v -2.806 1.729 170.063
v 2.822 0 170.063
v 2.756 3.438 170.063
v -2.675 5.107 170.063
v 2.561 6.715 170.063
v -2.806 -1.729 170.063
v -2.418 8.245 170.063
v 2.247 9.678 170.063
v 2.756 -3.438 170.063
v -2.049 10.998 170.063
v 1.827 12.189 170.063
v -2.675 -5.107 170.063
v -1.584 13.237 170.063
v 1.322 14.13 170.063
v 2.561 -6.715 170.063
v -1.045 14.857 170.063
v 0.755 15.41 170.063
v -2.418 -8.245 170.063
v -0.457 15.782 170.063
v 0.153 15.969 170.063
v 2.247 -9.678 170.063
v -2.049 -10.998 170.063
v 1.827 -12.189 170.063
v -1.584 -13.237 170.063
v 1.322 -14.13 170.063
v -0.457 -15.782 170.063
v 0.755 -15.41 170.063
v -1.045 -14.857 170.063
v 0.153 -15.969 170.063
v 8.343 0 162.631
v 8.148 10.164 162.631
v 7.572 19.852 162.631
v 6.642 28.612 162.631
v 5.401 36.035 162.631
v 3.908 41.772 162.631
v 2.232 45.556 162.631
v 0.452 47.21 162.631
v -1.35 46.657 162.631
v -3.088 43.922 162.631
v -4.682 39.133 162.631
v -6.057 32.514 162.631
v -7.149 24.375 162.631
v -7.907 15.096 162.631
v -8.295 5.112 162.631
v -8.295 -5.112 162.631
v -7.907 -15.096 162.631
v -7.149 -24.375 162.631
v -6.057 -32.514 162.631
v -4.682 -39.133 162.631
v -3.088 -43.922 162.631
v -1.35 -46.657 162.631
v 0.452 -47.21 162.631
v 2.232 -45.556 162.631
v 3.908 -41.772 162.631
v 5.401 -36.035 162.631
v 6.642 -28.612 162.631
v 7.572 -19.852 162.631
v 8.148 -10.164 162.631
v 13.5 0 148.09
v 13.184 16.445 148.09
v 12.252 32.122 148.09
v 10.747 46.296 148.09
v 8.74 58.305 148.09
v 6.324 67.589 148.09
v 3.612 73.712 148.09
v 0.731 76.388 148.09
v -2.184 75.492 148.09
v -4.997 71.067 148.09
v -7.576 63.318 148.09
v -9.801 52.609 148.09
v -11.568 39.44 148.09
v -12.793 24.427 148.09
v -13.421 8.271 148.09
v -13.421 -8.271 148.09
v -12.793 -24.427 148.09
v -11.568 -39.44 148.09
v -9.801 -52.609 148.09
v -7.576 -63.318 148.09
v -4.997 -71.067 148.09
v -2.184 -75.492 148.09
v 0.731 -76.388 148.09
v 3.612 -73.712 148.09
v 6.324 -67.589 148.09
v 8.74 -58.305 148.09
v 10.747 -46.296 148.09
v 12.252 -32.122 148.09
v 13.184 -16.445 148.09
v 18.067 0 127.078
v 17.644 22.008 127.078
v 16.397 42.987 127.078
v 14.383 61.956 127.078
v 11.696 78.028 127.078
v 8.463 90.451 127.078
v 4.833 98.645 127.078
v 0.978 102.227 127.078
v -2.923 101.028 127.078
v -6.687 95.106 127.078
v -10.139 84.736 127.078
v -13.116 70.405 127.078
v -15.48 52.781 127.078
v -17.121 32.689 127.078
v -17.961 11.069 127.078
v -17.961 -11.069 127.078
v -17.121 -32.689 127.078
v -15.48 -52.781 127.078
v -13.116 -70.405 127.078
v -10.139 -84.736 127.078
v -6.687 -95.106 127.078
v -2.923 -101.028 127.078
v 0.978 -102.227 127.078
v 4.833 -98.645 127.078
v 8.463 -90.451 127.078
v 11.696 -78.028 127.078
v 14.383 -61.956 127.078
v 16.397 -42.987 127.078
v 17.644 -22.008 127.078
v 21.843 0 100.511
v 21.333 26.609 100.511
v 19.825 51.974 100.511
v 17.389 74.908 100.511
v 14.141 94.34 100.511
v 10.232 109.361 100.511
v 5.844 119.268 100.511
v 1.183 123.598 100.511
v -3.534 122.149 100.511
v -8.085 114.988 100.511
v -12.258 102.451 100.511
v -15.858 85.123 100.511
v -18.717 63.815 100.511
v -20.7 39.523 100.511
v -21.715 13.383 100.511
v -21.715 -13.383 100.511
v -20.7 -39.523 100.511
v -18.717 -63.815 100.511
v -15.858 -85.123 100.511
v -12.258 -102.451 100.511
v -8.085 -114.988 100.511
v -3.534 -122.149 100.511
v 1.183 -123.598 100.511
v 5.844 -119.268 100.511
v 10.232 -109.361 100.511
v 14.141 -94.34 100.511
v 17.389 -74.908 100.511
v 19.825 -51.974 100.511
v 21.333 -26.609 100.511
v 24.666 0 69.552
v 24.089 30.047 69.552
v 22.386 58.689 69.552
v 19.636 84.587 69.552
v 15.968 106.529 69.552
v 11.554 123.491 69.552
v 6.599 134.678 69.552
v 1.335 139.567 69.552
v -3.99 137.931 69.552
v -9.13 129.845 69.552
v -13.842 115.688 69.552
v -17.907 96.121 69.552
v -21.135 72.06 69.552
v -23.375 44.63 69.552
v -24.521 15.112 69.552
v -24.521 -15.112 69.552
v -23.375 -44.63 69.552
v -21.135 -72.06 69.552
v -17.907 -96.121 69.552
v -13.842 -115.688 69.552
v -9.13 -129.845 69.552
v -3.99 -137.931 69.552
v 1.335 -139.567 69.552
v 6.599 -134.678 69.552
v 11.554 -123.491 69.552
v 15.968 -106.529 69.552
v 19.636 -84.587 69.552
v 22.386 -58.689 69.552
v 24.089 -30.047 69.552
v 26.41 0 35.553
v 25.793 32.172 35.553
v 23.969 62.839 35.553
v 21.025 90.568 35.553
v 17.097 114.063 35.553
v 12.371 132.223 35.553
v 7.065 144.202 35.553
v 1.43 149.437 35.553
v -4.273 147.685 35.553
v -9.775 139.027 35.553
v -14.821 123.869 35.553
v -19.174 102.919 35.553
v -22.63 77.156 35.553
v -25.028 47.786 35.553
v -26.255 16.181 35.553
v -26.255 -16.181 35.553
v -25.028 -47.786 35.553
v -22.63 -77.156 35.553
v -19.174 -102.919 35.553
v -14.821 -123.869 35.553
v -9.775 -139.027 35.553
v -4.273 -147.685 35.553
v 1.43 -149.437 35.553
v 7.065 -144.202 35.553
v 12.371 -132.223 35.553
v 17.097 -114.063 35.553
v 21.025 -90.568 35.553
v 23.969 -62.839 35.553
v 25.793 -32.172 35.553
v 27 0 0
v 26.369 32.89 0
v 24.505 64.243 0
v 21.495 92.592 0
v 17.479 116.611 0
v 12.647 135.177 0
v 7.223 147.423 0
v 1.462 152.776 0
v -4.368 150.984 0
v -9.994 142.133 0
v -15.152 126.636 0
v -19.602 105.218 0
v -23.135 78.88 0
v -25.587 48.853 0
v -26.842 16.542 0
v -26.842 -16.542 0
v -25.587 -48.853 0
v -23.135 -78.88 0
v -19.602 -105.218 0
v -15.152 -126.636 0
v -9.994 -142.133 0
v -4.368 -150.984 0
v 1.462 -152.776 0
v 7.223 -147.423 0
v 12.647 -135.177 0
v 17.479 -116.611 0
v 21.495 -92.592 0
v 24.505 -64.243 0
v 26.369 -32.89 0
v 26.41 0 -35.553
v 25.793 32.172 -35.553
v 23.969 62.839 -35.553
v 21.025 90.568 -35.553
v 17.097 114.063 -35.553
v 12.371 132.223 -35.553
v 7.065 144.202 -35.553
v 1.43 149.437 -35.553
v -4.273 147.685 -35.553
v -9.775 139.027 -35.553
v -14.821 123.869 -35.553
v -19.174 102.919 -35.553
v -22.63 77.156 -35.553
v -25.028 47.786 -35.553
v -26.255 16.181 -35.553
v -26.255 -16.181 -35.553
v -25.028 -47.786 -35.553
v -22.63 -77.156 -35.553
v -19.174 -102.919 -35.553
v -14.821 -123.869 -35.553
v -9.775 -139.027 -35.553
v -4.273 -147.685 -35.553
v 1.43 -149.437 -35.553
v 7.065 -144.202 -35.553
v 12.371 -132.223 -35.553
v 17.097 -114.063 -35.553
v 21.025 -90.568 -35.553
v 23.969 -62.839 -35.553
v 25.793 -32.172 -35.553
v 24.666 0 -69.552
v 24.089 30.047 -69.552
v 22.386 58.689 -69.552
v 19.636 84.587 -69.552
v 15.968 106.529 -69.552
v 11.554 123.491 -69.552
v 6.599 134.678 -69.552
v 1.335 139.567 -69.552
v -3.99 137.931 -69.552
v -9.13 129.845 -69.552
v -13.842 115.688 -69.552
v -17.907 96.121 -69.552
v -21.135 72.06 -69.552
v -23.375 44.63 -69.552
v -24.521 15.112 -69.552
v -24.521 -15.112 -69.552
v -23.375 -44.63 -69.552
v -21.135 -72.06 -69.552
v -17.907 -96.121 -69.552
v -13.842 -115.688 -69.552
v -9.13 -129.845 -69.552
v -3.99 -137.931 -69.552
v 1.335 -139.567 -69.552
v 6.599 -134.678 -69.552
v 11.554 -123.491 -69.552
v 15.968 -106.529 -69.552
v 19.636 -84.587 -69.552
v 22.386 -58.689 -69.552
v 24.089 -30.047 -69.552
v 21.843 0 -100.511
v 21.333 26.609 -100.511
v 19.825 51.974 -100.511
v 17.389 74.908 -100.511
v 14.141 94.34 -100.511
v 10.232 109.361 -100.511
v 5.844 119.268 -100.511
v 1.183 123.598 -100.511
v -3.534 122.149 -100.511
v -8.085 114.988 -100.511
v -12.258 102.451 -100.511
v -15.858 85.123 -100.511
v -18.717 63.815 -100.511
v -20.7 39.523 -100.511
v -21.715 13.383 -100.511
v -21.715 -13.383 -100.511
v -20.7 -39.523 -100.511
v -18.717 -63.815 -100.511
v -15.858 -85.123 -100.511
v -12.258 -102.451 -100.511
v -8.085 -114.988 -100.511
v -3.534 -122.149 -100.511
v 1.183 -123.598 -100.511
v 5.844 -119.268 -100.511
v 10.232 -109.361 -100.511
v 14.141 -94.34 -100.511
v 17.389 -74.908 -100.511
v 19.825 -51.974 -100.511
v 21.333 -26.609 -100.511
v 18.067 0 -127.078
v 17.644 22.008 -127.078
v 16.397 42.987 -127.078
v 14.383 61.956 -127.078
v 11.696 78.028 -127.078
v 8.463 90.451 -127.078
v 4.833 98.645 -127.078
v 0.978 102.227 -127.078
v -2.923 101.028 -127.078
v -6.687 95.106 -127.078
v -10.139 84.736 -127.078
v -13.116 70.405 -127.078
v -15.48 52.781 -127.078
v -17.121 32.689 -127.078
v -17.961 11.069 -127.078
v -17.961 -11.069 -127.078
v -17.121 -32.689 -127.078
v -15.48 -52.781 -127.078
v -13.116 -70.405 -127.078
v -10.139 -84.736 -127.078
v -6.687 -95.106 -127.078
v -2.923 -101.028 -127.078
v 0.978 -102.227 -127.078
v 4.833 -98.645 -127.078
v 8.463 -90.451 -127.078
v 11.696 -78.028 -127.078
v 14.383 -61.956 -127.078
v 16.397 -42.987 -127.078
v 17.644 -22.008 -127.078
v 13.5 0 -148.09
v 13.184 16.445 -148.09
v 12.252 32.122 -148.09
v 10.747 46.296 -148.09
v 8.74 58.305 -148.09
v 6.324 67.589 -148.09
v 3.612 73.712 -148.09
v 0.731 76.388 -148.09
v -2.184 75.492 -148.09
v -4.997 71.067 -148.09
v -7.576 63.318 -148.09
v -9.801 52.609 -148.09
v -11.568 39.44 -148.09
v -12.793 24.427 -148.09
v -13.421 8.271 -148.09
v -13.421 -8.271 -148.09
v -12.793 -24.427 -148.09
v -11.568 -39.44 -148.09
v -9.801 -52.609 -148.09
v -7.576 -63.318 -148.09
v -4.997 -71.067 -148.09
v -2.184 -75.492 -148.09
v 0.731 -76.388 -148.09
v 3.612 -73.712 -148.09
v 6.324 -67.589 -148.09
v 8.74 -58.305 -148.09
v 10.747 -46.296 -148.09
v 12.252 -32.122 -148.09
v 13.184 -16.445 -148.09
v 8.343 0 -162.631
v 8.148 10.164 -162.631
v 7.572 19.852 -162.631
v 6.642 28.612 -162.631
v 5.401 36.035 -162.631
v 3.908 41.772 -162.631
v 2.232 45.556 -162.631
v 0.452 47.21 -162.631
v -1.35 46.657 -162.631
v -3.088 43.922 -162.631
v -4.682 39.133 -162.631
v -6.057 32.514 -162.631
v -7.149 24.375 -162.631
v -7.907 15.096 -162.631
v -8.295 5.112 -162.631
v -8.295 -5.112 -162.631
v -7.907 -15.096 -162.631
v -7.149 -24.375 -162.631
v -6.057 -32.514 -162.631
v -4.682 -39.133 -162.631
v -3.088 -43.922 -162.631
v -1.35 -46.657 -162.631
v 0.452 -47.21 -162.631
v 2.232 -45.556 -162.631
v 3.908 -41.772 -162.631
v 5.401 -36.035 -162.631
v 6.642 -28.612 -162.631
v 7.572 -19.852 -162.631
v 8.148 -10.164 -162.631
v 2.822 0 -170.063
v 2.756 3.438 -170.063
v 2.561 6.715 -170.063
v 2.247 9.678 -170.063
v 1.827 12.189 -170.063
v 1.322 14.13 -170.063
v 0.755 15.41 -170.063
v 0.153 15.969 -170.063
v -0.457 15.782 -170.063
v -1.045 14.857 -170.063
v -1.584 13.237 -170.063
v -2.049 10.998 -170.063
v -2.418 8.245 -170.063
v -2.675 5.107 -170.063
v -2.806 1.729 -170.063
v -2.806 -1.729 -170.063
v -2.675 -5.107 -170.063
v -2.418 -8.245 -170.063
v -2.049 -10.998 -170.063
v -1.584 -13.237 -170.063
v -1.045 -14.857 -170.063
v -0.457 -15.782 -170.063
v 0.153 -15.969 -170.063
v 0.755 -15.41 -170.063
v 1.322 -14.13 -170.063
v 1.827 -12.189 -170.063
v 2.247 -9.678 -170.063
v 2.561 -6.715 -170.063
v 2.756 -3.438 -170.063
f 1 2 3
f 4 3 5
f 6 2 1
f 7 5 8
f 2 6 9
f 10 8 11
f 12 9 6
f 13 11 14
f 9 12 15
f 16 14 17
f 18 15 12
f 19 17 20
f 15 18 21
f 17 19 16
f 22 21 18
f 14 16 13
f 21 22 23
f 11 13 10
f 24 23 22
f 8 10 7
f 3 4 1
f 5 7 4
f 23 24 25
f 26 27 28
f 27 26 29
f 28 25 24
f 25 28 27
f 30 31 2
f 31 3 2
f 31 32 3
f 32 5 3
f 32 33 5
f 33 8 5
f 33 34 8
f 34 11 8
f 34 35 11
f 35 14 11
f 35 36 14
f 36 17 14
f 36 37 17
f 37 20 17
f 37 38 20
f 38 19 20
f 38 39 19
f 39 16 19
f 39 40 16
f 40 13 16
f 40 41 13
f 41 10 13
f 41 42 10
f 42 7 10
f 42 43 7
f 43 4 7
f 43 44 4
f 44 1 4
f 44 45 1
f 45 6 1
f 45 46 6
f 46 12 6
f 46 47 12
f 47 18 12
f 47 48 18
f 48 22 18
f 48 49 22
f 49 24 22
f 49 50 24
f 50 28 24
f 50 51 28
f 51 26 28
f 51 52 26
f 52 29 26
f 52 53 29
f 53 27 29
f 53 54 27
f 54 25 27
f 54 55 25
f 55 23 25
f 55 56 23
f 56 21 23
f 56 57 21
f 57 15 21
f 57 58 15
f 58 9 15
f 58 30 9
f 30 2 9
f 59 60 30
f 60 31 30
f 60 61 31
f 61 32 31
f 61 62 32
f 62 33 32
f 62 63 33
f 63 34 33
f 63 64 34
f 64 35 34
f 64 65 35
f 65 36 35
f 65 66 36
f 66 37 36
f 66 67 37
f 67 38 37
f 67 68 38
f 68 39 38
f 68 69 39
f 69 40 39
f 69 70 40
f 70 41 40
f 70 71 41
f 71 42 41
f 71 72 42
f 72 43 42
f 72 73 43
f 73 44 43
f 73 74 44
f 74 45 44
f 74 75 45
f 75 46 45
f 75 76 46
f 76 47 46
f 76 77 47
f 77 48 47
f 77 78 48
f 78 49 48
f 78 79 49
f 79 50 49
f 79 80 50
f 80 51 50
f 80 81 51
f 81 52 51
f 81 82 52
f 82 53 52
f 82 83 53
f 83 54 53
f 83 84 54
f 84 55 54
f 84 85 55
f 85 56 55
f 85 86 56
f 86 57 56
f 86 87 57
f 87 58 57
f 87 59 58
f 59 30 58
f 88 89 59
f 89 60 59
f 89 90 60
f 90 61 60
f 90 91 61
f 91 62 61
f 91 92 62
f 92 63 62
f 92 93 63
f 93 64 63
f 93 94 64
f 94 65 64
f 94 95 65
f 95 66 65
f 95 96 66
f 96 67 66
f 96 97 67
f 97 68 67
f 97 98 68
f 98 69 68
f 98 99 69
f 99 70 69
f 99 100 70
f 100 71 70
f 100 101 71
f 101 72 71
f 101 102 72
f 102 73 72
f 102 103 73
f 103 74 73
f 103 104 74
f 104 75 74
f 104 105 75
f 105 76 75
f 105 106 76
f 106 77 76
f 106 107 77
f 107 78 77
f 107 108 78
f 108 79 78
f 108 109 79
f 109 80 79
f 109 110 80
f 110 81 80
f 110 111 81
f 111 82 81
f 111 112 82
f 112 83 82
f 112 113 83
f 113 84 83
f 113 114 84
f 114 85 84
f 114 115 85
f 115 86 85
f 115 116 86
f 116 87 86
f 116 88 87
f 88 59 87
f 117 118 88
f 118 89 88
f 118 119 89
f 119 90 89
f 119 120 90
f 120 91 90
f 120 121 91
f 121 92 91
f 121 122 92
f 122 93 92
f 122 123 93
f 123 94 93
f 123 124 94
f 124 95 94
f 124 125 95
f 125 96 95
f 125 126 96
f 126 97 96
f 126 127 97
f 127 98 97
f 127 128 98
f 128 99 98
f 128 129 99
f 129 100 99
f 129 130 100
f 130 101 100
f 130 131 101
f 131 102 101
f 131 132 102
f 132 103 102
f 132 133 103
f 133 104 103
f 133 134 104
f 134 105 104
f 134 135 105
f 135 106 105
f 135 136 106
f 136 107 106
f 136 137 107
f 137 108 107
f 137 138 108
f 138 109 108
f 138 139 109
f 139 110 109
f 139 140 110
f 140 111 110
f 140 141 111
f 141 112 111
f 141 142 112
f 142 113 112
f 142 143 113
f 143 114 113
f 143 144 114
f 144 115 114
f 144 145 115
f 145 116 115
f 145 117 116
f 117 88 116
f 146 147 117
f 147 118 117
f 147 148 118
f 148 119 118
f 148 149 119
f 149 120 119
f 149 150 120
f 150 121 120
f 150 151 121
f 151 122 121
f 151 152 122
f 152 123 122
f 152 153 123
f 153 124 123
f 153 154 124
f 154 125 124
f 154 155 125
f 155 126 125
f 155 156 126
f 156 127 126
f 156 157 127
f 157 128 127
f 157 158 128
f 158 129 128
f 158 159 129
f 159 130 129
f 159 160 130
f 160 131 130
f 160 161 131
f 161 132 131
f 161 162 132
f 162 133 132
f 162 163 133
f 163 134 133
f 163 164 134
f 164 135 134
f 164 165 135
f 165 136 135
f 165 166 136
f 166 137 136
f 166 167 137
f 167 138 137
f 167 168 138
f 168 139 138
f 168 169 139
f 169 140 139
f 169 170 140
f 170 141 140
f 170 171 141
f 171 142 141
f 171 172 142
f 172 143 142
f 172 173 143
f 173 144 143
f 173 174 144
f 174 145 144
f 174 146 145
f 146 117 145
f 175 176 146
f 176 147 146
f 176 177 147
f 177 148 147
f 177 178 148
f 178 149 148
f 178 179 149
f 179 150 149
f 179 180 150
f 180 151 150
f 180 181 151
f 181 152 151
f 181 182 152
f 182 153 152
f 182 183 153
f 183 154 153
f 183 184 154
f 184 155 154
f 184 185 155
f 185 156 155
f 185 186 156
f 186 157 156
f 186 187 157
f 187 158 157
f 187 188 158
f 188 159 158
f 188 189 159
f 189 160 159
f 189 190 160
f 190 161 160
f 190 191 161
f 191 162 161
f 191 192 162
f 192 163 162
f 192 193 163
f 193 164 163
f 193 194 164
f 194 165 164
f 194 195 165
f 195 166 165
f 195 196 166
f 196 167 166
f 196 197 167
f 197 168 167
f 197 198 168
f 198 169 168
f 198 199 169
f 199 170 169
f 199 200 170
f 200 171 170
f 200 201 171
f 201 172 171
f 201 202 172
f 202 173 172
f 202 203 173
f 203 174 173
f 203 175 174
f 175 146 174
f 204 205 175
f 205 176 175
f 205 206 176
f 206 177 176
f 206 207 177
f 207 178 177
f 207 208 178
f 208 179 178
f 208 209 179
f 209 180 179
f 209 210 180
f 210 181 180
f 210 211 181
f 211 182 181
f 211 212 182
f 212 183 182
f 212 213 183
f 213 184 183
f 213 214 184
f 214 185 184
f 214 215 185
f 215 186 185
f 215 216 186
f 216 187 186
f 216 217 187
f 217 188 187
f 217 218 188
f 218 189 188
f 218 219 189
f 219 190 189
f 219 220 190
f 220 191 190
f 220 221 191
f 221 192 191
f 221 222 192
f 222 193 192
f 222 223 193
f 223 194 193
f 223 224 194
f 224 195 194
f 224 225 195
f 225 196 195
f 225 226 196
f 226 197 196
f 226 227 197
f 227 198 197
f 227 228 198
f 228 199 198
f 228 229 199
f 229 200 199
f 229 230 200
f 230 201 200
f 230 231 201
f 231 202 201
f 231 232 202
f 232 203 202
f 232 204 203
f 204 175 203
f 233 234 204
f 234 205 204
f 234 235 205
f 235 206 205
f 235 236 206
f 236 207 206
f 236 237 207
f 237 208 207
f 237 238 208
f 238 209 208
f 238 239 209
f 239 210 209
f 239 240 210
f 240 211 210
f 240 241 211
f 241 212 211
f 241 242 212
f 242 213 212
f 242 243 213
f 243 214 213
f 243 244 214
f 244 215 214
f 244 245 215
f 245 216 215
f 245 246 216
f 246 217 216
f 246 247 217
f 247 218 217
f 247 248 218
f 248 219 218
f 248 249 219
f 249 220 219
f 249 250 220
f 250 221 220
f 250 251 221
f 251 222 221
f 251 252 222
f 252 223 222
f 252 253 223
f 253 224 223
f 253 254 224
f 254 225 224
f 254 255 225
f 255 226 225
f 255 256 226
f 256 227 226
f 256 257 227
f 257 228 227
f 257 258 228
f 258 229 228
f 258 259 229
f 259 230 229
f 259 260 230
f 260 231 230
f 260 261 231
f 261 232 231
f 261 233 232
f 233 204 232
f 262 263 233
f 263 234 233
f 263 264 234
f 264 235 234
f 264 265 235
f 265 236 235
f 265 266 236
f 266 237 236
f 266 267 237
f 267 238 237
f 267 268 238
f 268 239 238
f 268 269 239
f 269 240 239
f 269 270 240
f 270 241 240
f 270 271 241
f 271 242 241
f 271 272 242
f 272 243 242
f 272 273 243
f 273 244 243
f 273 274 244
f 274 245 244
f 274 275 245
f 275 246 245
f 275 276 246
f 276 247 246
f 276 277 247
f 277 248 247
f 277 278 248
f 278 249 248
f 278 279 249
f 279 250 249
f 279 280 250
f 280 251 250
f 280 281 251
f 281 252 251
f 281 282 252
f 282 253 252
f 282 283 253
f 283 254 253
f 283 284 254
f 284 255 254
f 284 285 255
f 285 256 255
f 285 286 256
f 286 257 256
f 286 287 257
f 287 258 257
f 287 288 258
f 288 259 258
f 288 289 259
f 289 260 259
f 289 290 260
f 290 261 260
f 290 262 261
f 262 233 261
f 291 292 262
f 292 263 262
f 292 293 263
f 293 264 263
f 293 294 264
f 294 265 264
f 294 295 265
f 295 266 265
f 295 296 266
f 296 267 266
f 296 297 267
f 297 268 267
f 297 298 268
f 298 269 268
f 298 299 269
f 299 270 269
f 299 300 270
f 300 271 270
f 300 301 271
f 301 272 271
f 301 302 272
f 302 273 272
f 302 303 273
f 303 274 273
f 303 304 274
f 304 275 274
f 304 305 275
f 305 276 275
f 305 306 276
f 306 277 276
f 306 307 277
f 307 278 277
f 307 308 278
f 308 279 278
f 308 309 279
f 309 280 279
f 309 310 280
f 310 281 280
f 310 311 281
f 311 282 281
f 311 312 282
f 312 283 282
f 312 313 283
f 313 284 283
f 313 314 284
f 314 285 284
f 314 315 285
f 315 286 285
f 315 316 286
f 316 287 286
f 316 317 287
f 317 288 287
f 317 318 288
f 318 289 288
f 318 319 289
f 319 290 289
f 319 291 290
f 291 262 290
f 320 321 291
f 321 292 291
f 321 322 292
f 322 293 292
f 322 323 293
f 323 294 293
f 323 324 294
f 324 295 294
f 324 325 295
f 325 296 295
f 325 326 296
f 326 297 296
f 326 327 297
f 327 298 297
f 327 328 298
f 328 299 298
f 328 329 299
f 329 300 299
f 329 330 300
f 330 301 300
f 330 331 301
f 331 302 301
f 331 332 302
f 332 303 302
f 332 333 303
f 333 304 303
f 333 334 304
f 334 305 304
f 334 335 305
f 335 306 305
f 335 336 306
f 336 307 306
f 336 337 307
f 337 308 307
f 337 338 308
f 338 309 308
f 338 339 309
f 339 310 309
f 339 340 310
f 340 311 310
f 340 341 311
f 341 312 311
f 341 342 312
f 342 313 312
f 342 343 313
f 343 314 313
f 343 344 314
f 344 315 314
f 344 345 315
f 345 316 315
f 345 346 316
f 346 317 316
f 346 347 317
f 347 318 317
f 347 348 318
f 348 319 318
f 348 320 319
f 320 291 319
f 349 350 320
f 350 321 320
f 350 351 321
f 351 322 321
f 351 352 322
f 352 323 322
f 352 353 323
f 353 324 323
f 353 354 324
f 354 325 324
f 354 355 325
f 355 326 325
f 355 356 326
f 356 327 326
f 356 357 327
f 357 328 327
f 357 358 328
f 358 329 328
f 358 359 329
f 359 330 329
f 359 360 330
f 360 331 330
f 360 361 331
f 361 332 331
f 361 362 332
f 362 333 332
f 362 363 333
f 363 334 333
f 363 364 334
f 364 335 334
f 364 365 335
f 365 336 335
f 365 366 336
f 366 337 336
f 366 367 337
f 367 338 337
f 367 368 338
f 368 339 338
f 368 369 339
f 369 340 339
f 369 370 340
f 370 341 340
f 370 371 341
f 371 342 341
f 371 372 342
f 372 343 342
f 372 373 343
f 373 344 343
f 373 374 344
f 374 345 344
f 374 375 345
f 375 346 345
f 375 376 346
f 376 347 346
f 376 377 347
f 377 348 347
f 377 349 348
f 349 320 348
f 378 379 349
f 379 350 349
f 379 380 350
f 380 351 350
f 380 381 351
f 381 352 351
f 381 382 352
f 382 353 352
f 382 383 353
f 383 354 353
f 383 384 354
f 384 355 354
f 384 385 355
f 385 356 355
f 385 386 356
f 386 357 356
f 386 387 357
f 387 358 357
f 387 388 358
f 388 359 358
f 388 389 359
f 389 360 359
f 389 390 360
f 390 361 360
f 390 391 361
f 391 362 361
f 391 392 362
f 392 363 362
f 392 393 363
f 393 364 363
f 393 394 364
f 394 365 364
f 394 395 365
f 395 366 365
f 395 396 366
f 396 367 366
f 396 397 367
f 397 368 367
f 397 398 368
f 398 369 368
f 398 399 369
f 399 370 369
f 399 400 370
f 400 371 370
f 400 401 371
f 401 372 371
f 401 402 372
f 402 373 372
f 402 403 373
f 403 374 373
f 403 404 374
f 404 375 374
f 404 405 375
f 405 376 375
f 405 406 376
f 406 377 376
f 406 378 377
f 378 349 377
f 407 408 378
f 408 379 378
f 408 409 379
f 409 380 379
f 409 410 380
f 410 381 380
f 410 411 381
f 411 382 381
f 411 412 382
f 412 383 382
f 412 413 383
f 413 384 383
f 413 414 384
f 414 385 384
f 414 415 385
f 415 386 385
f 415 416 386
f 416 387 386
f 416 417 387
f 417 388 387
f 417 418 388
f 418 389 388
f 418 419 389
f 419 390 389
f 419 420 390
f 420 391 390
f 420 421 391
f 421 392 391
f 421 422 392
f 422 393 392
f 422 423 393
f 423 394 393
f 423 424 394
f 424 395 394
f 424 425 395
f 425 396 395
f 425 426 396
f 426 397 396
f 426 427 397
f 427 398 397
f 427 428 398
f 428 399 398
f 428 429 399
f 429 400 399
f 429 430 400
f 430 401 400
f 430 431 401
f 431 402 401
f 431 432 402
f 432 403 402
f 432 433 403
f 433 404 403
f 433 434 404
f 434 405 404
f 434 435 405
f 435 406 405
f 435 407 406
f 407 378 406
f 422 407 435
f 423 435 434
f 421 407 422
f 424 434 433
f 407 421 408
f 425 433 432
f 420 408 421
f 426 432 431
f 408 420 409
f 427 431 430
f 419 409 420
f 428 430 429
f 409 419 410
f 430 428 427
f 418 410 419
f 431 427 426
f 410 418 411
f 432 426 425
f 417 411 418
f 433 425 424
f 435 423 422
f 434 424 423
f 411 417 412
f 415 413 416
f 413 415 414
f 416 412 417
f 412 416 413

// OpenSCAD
// Generated by SolidPython 1.0.1 on 2020-07-29 00:46:46


scale(v = [3, 17, 19]) {
	sphere(r = 9);
}
/***********************************************
*********      SolidPython code:      **********
************************************************
 
# import packages: SolidPython
from solid import *
from solid.utils import *
from itertools import chain, combinations, permutations


class Resize:

    def __init__(self, scad_file):
        self.scad_file = scad_file
        #self.scad_file = import_scad(scad_file)
        # cone/cylinder param:
        self.r1 = 0
        self.r2 = 0
        self.h = 0
        # rectangular prism param:
        self.w = 0
        self.l = 0
        # ellipse param:
        self.r = 0

    # import OpenScad code (file name corresponds to shape)


    # classify shape + parameters
    def assign(self, param1, param2, param3):
        if self.scad_file == 'cone.scad':
            self.r1 = param1
            self.r2 = param2
            self.h = param3
        elif self.scad_file == 'cylinder.scad':
            self.r1 = param1
            self.r2 = param2
            self.h = param3
        elif self.scad_file == 'rectangularPrism.scad':
            self.h = param1
            self.l = param2
            self.w = param3
        else:
            self.r = param1
            self.h = param2

    # resize parameters
    def iterate(self):
        x = range(3, 20, 2)
        i = 1
        if self.scad_file == 'cone.scad':
            tempList = list(permutations(x, 2))
            for temp in tempList:
                param1 = temp[0]
                param2 = temp[1]
                filepath = 'produced_scad_files/' + 'cone' + str(param1) + '_' + str(param2) + '_' + '.scad'
                scad_render_to_file(cylinder(h=param1, r1=param2, r2=0), filepath)

        elif self.scad_file == 'cylinder.scad':
            tempList = list(permutations(x, 3))
            for temp in tempList:
                param1 = temp[0]
                param2 = temp[1]
                filepath = 'produced_scad_files/' + 'cylinder' + str(param1) + '_' + str(param2) + '_' + '.scad'
                scad_render_to_file(cylinder(h=param1, r1=param2, r2=param2), filepath)

        elif self.scad_file == 'rectangularPrism.scad':
            tempList = list(permutations(x, 3))
            for temp in tempList:
                param1 = temp[0]
                param2 = temp[1]
                param3 = temp[2]
                filepath = 'produced_scad_files/' + 'rectangularPrism' + str(param1) + '_' + str(param2) + '_' + str(
                    param3) + '.scad'
                scad_render_to_file(cube(size=(param1, param2, param3)), filepath)

        elif self.scad_file == 'ellipse.scad':
            tempList = list(permutations(x, 4))
            for temp in tempList:
                param1 = temp[0]
                param2 = temp[1]
                param3 = temp[2]
                param4 = temp[3]
                filepath = 'produced_scad_files/' + 'ellipse' + str(param1) + '_' + str(param2) + '_' + str(param3) + '_' + str(param4) + '.scad'
                scad_render_to_file(scale([param1, param2, param3])(sphere(r=param4)), filepath)

    def render_to_scadfile(self):
        scad_render_to_file(scad, 'example.scad') 
 
************************************************/
